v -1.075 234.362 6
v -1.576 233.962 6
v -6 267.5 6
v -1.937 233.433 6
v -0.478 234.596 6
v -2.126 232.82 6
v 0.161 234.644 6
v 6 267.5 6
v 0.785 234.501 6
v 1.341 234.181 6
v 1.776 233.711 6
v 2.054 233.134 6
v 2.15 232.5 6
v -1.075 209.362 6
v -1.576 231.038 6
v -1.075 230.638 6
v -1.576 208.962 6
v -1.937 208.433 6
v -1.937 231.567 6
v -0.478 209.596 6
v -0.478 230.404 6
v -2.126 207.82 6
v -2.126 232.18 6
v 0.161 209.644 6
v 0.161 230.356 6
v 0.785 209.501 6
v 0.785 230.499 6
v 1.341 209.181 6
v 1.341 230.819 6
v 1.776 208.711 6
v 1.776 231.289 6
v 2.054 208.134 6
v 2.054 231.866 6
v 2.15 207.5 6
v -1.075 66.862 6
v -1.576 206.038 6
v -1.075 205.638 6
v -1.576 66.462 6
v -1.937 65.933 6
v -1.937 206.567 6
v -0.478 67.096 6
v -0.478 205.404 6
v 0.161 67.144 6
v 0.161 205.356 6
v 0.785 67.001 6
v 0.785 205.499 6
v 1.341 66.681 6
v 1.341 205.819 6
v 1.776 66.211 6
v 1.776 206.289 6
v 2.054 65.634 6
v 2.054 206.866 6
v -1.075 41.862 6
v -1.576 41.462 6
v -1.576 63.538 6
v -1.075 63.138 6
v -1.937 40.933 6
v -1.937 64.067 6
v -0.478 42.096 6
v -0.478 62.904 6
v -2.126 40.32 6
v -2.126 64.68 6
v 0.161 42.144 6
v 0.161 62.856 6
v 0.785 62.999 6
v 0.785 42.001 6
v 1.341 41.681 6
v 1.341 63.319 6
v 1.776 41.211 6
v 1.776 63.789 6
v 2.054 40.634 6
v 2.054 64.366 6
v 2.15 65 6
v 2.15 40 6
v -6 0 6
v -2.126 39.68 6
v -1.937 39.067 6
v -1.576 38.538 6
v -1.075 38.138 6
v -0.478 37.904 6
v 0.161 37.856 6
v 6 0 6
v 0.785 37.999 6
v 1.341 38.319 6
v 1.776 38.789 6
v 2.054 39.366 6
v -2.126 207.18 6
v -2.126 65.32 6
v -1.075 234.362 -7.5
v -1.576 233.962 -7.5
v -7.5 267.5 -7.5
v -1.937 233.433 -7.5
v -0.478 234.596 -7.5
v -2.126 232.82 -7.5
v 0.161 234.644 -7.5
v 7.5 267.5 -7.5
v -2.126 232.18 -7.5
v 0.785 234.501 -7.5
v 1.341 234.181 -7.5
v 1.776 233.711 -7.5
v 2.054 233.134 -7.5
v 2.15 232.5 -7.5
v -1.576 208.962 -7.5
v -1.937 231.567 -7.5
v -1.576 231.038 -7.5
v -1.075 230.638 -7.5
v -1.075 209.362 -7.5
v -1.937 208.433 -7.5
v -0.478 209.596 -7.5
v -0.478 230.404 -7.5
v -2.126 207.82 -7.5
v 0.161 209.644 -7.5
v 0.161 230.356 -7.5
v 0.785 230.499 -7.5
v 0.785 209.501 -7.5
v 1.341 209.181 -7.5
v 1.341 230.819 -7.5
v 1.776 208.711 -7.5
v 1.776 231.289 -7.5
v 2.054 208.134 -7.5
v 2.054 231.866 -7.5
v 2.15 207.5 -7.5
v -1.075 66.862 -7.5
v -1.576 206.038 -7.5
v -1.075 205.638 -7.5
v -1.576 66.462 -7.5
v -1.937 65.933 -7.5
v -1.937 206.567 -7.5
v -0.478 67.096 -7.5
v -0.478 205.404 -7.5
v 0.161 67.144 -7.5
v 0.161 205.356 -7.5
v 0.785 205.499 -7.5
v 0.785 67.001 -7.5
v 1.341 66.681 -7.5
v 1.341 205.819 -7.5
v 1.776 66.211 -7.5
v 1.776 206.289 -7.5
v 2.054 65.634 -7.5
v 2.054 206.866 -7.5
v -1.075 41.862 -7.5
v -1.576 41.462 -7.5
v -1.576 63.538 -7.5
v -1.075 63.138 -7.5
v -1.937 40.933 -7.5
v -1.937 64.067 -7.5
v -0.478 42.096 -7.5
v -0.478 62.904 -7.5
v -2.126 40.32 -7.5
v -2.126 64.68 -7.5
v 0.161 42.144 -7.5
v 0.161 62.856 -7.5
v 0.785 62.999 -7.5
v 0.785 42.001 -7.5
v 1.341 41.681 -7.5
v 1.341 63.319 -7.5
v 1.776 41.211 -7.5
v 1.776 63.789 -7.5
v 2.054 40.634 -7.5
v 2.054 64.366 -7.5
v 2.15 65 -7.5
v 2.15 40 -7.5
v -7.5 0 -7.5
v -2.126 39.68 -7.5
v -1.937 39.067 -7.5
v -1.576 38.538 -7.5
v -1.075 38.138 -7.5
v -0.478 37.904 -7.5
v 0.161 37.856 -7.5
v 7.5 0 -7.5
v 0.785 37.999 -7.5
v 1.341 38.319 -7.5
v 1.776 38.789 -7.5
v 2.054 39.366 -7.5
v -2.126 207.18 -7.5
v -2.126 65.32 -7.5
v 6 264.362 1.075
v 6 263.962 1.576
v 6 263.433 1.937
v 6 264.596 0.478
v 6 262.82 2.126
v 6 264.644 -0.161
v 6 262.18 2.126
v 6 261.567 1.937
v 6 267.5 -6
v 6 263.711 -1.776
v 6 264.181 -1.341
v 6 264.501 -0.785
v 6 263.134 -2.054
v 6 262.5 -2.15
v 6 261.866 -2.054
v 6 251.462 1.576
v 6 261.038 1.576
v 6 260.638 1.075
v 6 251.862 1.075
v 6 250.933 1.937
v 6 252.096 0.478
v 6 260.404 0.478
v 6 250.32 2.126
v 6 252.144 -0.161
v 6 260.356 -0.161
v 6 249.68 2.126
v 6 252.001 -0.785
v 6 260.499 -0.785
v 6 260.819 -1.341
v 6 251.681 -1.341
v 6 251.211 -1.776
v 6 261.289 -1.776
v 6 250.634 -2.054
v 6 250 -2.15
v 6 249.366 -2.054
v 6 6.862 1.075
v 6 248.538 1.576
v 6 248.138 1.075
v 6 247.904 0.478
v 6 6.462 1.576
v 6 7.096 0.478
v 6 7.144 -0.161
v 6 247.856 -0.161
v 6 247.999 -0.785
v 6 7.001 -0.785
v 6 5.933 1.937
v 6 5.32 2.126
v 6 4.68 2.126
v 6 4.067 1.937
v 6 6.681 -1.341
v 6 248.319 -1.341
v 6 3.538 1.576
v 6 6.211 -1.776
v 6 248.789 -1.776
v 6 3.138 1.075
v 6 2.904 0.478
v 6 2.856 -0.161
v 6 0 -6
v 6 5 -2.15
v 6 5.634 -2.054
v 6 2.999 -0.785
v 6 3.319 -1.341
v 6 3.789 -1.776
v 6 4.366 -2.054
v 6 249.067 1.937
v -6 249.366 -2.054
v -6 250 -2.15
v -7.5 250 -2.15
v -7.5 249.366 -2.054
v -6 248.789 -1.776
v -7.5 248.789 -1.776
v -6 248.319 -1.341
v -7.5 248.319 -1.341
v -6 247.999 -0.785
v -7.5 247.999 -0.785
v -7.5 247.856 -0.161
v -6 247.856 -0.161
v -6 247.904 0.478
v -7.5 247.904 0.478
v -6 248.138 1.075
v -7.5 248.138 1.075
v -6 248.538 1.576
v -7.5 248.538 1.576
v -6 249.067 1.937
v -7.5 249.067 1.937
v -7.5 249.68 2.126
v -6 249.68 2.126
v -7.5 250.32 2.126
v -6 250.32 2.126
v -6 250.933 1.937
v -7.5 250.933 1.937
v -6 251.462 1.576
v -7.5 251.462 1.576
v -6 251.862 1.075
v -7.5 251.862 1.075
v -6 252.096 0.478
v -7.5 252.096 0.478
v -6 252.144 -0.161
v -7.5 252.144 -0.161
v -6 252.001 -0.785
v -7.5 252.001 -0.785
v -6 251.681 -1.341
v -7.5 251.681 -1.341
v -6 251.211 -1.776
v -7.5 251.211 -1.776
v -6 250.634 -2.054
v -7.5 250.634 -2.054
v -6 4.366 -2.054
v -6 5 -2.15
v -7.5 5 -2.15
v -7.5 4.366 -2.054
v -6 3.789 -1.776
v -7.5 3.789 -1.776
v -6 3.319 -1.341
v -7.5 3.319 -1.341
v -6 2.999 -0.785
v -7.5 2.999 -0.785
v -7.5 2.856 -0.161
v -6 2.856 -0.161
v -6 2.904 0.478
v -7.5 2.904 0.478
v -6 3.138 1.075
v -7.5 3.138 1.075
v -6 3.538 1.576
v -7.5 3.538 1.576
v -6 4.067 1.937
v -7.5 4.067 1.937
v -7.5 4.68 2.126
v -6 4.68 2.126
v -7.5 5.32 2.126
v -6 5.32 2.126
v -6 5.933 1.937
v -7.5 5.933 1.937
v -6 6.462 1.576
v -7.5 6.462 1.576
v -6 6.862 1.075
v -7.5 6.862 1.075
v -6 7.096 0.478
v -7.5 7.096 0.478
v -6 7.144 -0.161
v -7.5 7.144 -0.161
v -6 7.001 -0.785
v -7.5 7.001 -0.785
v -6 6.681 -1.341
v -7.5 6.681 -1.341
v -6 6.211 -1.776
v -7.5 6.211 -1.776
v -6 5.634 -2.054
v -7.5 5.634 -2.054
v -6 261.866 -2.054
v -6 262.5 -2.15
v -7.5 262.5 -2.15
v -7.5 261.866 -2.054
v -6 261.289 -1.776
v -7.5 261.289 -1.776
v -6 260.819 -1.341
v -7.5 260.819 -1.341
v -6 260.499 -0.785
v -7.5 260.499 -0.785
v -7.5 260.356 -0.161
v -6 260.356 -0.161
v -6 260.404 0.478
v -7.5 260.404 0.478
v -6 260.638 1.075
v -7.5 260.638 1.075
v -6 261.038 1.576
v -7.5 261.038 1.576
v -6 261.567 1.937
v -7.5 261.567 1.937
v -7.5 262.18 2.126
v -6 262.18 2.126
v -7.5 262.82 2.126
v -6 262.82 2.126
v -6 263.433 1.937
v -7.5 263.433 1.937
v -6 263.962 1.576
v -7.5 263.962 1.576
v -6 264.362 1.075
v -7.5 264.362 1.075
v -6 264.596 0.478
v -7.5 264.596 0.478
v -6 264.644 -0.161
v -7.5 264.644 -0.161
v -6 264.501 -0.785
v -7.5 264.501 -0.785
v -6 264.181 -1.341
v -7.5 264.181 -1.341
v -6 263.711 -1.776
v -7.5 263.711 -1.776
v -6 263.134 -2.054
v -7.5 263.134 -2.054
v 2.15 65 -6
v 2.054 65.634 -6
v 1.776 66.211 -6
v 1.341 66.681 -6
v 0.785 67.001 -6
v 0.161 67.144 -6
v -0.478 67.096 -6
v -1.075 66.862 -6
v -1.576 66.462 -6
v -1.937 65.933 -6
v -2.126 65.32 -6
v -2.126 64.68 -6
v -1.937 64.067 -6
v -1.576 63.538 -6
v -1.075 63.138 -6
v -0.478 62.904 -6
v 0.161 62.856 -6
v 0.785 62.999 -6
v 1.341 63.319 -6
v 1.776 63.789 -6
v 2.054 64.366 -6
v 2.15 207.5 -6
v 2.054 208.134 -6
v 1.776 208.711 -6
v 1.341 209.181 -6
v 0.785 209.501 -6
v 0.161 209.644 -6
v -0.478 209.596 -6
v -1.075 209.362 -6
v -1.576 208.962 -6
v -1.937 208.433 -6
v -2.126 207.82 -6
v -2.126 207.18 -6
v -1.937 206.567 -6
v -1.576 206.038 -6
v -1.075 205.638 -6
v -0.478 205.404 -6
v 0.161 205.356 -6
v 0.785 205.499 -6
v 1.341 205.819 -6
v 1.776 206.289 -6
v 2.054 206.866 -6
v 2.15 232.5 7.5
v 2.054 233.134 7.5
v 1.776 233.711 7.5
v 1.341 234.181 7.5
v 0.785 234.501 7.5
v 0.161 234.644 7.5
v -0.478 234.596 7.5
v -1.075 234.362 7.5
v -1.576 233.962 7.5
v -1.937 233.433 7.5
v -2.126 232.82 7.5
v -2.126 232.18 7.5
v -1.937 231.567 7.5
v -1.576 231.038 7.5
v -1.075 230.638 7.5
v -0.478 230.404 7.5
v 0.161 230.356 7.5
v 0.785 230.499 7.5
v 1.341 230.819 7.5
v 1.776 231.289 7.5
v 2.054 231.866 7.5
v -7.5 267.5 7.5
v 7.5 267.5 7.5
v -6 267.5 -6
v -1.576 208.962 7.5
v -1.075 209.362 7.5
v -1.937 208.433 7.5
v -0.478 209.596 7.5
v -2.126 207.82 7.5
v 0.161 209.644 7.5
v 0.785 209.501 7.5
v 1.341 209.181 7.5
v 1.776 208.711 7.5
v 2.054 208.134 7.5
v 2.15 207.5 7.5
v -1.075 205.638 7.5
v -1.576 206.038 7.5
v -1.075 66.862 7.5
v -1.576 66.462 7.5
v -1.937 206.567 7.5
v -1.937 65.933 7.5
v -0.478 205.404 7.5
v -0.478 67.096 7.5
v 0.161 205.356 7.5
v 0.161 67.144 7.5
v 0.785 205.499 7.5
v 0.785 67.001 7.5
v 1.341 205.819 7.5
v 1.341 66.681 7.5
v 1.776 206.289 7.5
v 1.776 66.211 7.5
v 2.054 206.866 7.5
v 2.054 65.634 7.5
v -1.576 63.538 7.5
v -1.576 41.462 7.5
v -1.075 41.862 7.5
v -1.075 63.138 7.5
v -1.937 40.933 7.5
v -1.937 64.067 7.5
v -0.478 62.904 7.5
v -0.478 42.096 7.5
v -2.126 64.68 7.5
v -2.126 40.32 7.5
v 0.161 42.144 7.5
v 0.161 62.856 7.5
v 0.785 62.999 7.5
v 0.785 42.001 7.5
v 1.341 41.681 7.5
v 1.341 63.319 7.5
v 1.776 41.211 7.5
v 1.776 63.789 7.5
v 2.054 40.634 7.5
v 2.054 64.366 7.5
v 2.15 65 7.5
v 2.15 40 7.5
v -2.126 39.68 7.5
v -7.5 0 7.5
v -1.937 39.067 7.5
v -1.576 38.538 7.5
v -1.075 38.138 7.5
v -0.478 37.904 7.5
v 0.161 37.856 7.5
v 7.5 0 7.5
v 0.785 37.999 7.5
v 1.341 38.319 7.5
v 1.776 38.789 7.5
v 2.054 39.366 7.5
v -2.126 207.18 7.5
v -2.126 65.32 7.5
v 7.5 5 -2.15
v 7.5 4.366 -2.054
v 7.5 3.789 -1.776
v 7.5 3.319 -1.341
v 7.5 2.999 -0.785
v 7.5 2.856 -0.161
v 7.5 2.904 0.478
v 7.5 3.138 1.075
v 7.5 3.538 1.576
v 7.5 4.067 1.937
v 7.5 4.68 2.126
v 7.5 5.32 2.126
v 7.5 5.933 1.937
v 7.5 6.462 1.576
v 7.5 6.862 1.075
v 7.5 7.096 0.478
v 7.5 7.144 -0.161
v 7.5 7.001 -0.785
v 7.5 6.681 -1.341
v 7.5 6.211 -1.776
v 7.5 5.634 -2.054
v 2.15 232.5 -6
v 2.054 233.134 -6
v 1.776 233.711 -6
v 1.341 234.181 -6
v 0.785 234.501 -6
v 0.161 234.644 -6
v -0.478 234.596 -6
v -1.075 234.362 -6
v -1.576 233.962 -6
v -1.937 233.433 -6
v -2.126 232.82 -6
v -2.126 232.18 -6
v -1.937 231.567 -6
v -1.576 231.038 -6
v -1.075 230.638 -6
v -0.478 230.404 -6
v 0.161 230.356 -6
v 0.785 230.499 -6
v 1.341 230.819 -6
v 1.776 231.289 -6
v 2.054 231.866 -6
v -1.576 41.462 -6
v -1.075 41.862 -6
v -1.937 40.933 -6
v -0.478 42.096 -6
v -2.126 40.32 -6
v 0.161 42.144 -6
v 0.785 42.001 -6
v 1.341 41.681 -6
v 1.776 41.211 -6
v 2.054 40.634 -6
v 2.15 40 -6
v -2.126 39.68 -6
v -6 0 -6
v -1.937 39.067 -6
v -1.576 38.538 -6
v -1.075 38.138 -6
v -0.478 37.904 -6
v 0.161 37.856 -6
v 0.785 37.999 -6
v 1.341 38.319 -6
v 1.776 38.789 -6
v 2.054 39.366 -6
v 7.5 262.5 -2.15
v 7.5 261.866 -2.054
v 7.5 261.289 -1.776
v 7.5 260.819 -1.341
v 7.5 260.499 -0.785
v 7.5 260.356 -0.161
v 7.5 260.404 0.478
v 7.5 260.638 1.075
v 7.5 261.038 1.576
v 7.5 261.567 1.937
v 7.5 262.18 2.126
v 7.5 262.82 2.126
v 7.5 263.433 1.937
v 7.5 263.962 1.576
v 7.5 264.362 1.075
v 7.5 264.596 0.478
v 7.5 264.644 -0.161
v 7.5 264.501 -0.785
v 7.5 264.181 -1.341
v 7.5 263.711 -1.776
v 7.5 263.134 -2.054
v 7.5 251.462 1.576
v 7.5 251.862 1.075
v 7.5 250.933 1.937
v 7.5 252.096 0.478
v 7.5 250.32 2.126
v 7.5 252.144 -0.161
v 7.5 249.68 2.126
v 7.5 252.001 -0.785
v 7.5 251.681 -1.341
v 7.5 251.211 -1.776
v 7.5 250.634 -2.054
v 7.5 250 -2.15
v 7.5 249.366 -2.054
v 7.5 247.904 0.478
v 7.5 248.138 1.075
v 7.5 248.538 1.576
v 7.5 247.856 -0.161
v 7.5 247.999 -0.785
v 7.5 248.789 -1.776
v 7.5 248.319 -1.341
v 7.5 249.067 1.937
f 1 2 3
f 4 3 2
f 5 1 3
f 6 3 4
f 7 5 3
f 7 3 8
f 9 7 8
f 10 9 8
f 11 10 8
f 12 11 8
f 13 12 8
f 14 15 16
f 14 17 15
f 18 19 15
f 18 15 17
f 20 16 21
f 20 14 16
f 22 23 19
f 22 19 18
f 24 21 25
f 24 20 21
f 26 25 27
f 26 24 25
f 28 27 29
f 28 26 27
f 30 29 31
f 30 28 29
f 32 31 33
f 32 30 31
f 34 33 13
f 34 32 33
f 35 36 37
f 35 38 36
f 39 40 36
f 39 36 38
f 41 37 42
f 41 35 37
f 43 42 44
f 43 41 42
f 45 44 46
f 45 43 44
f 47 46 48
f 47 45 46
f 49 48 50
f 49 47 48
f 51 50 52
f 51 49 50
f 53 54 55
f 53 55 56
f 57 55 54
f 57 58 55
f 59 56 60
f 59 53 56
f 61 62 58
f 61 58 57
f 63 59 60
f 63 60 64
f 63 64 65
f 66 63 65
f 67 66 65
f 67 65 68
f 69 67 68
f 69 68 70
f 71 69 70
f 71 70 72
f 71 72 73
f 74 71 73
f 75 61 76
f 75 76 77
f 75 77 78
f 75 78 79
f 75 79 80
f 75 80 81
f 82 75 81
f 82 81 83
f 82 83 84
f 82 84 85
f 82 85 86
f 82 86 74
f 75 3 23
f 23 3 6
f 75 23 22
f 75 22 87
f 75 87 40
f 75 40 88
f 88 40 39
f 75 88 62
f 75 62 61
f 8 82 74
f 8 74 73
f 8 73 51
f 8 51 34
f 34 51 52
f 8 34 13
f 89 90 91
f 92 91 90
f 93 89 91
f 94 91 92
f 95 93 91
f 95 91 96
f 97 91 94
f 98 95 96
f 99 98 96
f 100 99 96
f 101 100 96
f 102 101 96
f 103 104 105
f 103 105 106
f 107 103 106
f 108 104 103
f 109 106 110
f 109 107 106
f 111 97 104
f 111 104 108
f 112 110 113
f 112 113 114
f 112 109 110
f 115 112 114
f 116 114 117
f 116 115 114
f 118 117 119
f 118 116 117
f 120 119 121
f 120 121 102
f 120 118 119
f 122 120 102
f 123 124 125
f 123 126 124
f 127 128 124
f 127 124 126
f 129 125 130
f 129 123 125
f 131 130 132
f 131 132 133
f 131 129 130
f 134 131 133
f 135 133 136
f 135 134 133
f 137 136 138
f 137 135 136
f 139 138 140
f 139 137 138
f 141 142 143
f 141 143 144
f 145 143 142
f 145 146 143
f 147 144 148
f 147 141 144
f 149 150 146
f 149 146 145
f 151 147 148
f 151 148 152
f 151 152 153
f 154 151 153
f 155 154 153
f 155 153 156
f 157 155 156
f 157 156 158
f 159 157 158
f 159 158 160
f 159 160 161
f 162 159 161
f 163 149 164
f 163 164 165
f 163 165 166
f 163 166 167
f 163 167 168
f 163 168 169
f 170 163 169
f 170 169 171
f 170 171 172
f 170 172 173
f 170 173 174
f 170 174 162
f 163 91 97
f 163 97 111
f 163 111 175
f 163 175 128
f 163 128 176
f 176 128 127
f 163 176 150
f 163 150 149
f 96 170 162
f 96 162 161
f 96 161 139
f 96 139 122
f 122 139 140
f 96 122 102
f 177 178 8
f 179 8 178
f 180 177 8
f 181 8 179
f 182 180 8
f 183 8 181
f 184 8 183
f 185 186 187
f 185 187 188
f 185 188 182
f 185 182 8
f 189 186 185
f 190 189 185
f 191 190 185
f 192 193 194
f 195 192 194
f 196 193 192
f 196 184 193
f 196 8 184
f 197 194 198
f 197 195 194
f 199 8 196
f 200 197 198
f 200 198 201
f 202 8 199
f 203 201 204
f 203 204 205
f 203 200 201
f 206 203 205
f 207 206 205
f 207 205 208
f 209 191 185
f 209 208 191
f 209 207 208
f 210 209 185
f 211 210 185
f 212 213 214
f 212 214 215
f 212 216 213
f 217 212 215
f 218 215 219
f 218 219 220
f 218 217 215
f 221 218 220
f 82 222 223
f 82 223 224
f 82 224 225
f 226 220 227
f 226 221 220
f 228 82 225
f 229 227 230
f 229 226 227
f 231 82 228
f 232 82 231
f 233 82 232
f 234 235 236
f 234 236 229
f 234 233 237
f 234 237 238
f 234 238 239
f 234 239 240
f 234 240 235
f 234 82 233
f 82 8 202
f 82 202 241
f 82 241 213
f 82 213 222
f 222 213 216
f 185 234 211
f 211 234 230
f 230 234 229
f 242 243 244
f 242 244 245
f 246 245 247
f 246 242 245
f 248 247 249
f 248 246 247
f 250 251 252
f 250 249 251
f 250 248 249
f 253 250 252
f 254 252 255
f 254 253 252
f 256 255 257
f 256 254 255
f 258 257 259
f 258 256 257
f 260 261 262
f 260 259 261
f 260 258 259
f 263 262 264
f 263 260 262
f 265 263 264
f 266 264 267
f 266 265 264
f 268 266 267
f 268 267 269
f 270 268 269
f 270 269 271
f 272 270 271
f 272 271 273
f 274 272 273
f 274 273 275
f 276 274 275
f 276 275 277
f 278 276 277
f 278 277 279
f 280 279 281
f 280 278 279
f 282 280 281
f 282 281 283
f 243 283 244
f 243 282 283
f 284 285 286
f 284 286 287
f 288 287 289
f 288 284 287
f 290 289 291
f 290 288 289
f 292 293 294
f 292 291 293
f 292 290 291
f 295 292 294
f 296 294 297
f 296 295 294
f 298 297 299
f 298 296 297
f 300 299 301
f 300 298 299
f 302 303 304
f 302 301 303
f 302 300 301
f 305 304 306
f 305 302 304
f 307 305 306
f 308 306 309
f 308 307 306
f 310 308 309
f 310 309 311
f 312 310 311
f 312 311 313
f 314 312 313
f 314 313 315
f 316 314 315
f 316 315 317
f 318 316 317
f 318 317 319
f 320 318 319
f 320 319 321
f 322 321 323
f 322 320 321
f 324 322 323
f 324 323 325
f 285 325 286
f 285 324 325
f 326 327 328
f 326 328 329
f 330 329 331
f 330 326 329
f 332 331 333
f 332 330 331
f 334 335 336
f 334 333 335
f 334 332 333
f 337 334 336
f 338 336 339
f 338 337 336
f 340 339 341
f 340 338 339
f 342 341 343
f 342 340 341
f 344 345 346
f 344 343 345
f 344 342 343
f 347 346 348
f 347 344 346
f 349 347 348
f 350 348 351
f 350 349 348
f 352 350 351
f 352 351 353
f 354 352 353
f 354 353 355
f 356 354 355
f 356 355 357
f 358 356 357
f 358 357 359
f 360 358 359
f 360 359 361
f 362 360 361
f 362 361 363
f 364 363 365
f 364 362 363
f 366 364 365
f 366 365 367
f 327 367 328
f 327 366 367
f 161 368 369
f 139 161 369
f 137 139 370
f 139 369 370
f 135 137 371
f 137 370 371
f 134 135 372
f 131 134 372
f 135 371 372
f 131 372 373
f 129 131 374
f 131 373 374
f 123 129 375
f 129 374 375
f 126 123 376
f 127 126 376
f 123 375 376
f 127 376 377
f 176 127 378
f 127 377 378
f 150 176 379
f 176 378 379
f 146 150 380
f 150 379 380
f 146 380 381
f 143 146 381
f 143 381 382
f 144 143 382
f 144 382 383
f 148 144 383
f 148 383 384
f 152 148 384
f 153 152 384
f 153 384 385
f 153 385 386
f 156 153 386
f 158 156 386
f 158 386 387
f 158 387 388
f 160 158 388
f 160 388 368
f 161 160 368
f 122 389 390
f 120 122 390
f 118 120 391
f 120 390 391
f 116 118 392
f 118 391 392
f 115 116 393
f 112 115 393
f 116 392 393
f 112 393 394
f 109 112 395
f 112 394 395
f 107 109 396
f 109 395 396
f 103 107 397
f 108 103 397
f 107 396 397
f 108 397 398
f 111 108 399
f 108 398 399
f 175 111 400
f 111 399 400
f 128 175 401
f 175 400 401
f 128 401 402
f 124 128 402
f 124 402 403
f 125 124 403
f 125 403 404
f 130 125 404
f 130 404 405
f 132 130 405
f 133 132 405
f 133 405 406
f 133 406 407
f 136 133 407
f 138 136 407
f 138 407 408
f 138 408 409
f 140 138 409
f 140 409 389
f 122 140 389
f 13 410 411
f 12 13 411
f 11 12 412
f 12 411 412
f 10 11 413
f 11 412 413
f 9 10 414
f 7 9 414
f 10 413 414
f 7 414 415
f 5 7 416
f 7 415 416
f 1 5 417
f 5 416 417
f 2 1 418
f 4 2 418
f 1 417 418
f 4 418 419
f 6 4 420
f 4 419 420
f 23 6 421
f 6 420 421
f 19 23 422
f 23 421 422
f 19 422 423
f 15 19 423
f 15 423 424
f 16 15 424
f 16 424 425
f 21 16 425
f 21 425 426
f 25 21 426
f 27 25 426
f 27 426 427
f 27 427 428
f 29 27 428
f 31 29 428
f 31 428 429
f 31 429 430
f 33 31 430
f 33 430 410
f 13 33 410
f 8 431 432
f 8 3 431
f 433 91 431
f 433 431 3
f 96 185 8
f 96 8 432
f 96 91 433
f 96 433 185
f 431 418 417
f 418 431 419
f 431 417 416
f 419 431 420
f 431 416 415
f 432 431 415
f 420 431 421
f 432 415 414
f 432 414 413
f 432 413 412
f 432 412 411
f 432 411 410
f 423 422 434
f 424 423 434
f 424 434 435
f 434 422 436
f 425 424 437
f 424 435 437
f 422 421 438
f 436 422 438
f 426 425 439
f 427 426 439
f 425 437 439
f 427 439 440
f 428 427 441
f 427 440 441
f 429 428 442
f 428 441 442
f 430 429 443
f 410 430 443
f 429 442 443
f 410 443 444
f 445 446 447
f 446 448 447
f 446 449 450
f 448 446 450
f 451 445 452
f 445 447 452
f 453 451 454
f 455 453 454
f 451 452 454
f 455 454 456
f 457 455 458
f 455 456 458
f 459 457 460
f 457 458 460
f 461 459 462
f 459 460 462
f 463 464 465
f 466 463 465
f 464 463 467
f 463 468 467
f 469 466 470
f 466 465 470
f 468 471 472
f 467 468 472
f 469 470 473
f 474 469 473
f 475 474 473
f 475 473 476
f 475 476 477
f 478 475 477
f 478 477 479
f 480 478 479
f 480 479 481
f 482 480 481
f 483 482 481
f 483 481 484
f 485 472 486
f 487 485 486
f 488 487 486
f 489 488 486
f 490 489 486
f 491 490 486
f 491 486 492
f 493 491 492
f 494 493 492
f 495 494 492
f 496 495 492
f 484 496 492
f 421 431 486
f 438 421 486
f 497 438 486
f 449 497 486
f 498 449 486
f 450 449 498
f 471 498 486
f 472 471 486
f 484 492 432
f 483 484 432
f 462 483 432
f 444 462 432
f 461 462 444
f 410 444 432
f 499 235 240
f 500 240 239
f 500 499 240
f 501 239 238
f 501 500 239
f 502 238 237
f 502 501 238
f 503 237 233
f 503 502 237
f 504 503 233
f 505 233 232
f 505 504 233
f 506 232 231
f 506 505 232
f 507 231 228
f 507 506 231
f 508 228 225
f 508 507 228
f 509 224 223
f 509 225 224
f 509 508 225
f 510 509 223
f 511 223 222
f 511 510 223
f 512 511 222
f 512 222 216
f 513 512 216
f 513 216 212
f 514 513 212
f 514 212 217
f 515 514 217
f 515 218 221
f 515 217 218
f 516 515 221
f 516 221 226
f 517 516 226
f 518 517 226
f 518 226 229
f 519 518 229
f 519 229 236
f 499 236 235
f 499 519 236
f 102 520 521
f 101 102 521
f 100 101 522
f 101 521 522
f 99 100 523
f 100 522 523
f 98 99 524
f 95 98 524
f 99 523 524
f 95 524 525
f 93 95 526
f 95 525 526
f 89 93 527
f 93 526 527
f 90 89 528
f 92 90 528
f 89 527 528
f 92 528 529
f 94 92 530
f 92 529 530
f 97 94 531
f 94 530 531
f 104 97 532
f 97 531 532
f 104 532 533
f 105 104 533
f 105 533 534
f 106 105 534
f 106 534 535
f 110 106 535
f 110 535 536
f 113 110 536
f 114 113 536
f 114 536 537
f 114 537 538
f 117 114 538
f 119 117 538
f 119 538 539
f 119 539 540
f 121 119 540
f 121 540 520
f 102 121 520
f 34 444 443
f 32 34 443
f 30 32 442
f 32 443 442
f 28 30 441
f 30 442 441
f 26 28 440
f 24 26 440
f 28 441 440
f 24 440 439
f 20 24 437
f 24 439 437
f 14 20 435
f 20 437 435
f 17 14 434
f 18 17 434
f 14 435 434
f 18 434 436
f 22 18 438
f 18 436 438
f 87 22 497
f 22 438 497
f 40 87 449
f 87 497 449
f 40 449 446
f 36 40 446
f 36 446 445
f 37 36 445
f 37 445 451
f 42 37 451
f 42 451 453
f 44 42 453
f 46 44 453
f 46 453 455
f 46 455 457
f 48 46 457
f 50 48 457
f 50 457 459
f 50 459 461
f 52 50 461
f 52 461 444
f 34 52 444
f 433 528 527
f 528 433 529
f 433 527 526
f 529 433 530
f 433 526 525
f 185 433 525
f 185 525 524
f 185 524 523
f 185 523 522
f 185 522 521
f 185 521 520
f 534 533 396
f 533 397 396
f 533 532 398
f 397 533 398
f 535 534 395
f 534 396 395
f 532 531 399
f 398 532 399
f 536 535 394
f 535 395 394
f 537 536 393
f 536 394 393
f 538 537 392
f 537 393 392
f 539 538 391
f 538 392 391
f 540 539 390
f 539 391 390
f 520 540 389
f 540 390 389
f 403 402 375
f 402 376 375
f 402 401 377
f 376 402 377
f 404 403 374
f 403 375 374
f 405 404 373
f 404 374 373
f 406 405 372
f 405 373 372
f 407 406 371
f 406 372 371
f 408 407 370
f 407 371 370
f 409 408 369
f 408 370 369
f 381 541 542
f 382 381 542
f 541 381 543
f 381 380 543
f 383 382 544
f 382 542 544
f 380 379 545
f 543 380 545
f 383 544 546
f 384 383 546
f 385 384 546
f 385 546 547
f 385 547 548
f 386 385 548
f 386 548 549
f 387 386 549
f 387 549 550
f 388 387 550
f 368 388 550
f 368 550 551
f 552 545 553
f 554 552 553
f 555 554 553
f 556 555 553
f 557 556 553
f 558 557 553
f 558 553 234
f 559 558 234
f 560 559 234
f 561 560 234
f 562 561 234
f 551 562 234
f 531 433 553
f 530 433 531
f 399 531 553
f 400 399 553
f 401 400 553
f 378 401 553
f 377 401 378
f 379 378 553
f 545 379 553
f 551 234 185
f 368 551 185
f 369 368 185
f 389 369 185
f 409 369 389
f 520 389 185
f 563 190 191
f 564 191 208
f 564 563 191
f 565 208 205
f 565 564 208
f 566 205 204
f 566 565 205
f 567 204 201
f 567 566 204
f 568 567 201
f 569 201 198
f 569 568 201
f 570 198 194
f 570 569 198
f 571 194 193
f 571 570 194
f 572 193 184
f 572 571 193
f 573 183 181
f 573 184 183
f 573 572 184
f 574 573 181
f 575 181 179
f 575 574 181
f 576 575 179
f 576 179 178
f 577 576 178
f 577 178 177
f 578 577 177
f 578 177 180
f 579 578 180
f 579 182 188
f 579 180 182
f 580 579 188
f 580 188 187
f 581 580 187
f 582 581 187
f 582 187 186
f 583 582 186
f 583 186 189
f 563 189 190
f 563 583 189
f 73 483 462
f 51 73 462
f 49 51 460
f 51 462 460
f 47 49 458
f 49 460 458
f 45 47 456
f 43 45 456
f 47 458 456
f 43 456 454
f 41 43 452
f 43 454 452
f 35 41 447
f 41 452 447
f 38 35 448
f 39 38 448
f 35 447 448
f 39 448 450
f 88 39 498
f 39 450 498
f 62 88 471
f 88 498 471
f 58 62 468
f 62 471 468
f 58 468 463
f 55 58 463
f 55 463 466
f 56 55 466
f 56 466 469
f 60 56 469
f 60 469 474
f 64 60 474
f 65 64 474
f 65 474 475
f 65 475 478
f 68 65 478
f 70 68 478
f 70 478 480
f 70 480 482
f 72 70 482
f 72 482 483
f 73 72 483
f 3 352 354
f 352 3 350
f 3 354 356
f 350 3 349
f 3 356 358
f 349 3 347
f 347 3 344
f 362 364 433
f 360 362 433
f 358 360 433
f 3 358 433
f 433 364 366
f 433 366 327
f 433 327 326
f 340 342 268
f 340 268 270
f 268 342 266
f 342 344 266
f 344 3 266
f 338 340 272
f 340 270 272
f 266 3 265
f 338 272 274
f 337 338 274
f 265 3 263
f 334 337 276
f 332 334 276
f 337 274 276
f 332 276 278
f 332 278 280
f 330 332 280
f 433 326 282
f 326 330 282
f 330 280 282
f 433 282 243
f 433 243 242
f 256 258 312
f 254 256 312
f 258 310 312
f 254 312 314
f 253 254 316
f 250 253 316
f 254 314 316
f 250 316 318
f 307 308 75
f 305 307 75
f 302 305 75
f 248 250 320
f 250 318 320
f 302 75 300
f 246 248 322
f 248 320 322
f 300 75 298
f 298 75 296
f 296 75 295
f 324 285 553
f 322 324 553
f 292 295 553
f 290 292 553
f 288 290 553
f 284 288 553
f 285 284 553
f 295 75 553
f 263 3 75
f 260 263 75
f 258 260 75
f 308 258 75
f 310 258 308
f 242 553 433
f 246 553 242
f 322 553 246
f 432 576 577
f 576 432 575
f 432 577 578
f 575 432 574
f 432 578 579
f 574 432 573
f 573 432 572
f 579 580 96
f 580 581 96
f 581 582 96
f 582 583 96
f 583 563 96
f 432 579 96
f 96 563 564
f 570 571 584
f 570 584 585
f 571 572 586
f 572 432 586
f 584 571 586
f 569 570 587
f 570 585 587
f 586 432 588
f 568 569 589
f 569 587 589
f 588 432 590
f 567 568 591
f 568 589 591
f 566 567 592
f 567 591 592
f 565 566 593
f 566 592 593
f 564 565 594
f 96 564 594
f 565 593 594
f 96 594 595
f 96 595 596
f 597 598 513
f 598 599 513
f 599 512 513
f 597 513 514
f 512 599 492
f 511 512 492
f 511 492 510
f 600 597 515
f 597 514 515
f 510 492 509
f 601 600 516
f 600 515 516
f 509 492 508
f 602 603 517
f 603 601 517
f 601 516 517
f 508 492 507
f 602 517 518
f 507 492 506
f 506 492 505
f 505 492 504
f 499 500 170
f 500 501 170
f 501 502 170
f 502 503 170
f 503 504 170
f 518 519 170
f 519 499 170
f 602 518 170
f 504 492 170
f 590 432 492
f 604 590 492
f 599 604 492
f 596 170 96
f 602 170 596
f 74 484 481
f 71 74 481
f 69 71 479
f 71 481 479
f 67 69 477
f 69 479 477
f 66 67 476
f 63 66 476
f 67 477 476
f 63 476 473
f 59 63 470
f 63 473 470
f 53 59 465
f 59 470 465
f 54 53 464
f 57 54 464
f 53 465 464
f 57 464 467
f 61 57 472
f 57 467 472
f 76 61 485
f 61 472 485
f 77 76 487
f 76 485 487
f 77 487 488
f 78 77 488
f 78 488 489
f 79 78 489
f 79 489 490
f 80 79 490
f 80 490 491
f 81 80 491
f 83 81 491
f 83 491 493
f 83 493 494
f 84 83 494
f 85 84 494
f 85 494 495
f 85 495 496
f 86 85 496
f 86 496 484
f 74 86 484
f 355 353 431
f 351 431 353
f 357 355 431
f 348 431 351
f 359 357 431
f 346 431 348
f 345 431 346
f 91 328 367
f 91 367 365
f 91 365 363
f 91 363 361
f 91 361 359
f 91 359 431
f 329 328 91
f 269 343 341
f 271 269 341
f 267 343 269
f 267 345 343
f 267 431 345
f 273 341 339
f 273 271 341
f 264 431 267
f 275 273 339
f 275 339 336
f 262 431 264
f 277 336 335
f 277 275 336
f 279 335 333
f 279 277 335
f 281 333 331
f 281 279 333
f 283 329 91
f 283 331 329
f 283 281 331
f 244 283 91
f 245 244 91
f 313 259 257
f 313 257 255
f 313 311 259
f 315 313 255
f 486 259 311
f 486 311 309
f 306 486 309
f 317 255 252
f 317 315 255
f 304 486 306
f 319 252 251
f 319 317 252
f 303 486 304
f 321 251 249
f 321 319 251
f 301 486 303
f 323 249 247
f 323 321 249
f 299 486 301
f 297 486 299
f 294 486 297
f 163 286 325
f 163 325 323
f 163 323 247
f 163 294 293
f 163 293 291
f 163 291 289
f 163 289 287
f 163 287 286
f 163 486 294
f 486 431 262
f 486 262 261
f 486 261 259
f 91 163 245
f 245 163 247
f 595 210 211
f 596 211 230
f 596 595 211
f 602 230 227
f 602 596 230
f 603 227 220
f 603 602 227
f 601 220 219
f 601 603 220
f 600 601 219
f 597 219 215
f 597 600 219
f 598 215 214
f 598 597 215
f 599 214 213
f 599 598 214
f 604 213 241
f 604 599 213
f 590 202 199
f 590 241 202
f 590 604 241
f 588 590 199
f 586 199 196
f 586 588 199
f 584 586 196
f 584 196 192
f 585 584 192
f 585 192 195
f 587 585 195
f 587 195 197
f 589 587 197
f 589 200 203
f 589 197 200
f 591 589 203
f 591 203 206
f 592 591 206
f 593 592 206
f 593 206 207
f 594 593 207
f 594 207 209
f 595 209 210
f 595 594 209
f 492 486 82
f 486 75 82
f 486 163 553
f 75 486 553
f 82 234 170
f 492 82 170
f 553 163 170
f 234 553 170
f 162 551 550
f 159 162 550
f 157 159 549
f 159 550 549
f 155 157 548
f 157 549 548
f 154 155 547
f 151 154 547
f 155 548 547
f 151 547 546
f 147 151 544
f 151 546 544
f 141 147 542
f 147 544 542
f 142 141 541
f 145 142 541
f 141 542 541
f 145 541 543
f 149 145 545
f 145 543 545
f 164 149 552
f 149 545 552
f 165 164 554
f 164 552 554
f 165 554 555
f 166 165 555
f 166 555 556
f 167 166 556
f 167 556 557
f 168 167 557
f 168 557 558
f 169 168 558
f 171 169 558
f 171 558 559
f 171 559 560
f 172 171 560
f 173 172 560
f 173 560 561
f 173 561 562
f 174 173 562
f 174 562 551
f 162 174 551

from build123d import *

# Parameters (mm, degrees)
SKETCH_1_W          = 15
SKETCH_1_H          = 15
SKETCH_1_W_2        = 12
SKETCH_1_H_2        = 12
EXTRUDE_1_DEPTH     = 267.5
SKETCH_2_R          = 2.15
CUT_EXTRUDE_1_DEPTH = 269.025185384
SKETCH_3_R          = 2.15
CUT_EXTRUDE_2_DEPTH = 269.025185384


with BuildPart() as part:
    # ｽｹｯﾁ1 → 押し出し-薄板1 (new body)
    with BuildSketch(Plane(origin=(0, 0, 0), x_dir=(1, 0, 0), z_dir=(0, 1, 0))):
        Rectangle(SKETCH_1_W, SKETCH_1_H)
        Rectangle(SKETCH_1_W_2, SKETCH_1_H_2, mode=Mode.SUBTRACT)
    extrude(amount=EXTRUDE_1_DEPTH)

    # ｽｹｯﾁ2 → ｶｯﾄ - 押し出し1 (cut, through all)
    with BuildSketch(Plane.ZY.offset(-7.5)):
        with Locations(Location((0, 5, 0), (0, 0, 180))):
            Circle(SKETCH_2_R)
        with Locations(Location((0, 262.5, 0), (0, 0, 180))):
            Circle(SKETCH_2_R)
        with Locations(Location((0, 250, 0), (0, 0, 180))):
            Circle(SKETCH_2_R)
    extrude(amount=CUT_EXTRUDE_1_DEPTH, mode=Mode.SUBTRACT)

    # ｽｹｯﾁ3 → ｶｯﾄ - 押し出し2 (cut, through all)
    with BuildSketch(Plane.XY.offset(7.5)):
        with Locations((0, 207.5)):
            Circle(SKETCH_3_R)
        with Locations((0, 232.5)):
            Circle(SKETCH_3_R)
        with Locations((0, 65)):
            Circle(SKETCH_3_R)
        with Locations((0, 40)):
            Circle(SKETCH_3_R)
    extrude(amount=-CUT_EXTRUDE_2_DEPTH, mode=Mode.SUBTRACT)


solid = part.part
